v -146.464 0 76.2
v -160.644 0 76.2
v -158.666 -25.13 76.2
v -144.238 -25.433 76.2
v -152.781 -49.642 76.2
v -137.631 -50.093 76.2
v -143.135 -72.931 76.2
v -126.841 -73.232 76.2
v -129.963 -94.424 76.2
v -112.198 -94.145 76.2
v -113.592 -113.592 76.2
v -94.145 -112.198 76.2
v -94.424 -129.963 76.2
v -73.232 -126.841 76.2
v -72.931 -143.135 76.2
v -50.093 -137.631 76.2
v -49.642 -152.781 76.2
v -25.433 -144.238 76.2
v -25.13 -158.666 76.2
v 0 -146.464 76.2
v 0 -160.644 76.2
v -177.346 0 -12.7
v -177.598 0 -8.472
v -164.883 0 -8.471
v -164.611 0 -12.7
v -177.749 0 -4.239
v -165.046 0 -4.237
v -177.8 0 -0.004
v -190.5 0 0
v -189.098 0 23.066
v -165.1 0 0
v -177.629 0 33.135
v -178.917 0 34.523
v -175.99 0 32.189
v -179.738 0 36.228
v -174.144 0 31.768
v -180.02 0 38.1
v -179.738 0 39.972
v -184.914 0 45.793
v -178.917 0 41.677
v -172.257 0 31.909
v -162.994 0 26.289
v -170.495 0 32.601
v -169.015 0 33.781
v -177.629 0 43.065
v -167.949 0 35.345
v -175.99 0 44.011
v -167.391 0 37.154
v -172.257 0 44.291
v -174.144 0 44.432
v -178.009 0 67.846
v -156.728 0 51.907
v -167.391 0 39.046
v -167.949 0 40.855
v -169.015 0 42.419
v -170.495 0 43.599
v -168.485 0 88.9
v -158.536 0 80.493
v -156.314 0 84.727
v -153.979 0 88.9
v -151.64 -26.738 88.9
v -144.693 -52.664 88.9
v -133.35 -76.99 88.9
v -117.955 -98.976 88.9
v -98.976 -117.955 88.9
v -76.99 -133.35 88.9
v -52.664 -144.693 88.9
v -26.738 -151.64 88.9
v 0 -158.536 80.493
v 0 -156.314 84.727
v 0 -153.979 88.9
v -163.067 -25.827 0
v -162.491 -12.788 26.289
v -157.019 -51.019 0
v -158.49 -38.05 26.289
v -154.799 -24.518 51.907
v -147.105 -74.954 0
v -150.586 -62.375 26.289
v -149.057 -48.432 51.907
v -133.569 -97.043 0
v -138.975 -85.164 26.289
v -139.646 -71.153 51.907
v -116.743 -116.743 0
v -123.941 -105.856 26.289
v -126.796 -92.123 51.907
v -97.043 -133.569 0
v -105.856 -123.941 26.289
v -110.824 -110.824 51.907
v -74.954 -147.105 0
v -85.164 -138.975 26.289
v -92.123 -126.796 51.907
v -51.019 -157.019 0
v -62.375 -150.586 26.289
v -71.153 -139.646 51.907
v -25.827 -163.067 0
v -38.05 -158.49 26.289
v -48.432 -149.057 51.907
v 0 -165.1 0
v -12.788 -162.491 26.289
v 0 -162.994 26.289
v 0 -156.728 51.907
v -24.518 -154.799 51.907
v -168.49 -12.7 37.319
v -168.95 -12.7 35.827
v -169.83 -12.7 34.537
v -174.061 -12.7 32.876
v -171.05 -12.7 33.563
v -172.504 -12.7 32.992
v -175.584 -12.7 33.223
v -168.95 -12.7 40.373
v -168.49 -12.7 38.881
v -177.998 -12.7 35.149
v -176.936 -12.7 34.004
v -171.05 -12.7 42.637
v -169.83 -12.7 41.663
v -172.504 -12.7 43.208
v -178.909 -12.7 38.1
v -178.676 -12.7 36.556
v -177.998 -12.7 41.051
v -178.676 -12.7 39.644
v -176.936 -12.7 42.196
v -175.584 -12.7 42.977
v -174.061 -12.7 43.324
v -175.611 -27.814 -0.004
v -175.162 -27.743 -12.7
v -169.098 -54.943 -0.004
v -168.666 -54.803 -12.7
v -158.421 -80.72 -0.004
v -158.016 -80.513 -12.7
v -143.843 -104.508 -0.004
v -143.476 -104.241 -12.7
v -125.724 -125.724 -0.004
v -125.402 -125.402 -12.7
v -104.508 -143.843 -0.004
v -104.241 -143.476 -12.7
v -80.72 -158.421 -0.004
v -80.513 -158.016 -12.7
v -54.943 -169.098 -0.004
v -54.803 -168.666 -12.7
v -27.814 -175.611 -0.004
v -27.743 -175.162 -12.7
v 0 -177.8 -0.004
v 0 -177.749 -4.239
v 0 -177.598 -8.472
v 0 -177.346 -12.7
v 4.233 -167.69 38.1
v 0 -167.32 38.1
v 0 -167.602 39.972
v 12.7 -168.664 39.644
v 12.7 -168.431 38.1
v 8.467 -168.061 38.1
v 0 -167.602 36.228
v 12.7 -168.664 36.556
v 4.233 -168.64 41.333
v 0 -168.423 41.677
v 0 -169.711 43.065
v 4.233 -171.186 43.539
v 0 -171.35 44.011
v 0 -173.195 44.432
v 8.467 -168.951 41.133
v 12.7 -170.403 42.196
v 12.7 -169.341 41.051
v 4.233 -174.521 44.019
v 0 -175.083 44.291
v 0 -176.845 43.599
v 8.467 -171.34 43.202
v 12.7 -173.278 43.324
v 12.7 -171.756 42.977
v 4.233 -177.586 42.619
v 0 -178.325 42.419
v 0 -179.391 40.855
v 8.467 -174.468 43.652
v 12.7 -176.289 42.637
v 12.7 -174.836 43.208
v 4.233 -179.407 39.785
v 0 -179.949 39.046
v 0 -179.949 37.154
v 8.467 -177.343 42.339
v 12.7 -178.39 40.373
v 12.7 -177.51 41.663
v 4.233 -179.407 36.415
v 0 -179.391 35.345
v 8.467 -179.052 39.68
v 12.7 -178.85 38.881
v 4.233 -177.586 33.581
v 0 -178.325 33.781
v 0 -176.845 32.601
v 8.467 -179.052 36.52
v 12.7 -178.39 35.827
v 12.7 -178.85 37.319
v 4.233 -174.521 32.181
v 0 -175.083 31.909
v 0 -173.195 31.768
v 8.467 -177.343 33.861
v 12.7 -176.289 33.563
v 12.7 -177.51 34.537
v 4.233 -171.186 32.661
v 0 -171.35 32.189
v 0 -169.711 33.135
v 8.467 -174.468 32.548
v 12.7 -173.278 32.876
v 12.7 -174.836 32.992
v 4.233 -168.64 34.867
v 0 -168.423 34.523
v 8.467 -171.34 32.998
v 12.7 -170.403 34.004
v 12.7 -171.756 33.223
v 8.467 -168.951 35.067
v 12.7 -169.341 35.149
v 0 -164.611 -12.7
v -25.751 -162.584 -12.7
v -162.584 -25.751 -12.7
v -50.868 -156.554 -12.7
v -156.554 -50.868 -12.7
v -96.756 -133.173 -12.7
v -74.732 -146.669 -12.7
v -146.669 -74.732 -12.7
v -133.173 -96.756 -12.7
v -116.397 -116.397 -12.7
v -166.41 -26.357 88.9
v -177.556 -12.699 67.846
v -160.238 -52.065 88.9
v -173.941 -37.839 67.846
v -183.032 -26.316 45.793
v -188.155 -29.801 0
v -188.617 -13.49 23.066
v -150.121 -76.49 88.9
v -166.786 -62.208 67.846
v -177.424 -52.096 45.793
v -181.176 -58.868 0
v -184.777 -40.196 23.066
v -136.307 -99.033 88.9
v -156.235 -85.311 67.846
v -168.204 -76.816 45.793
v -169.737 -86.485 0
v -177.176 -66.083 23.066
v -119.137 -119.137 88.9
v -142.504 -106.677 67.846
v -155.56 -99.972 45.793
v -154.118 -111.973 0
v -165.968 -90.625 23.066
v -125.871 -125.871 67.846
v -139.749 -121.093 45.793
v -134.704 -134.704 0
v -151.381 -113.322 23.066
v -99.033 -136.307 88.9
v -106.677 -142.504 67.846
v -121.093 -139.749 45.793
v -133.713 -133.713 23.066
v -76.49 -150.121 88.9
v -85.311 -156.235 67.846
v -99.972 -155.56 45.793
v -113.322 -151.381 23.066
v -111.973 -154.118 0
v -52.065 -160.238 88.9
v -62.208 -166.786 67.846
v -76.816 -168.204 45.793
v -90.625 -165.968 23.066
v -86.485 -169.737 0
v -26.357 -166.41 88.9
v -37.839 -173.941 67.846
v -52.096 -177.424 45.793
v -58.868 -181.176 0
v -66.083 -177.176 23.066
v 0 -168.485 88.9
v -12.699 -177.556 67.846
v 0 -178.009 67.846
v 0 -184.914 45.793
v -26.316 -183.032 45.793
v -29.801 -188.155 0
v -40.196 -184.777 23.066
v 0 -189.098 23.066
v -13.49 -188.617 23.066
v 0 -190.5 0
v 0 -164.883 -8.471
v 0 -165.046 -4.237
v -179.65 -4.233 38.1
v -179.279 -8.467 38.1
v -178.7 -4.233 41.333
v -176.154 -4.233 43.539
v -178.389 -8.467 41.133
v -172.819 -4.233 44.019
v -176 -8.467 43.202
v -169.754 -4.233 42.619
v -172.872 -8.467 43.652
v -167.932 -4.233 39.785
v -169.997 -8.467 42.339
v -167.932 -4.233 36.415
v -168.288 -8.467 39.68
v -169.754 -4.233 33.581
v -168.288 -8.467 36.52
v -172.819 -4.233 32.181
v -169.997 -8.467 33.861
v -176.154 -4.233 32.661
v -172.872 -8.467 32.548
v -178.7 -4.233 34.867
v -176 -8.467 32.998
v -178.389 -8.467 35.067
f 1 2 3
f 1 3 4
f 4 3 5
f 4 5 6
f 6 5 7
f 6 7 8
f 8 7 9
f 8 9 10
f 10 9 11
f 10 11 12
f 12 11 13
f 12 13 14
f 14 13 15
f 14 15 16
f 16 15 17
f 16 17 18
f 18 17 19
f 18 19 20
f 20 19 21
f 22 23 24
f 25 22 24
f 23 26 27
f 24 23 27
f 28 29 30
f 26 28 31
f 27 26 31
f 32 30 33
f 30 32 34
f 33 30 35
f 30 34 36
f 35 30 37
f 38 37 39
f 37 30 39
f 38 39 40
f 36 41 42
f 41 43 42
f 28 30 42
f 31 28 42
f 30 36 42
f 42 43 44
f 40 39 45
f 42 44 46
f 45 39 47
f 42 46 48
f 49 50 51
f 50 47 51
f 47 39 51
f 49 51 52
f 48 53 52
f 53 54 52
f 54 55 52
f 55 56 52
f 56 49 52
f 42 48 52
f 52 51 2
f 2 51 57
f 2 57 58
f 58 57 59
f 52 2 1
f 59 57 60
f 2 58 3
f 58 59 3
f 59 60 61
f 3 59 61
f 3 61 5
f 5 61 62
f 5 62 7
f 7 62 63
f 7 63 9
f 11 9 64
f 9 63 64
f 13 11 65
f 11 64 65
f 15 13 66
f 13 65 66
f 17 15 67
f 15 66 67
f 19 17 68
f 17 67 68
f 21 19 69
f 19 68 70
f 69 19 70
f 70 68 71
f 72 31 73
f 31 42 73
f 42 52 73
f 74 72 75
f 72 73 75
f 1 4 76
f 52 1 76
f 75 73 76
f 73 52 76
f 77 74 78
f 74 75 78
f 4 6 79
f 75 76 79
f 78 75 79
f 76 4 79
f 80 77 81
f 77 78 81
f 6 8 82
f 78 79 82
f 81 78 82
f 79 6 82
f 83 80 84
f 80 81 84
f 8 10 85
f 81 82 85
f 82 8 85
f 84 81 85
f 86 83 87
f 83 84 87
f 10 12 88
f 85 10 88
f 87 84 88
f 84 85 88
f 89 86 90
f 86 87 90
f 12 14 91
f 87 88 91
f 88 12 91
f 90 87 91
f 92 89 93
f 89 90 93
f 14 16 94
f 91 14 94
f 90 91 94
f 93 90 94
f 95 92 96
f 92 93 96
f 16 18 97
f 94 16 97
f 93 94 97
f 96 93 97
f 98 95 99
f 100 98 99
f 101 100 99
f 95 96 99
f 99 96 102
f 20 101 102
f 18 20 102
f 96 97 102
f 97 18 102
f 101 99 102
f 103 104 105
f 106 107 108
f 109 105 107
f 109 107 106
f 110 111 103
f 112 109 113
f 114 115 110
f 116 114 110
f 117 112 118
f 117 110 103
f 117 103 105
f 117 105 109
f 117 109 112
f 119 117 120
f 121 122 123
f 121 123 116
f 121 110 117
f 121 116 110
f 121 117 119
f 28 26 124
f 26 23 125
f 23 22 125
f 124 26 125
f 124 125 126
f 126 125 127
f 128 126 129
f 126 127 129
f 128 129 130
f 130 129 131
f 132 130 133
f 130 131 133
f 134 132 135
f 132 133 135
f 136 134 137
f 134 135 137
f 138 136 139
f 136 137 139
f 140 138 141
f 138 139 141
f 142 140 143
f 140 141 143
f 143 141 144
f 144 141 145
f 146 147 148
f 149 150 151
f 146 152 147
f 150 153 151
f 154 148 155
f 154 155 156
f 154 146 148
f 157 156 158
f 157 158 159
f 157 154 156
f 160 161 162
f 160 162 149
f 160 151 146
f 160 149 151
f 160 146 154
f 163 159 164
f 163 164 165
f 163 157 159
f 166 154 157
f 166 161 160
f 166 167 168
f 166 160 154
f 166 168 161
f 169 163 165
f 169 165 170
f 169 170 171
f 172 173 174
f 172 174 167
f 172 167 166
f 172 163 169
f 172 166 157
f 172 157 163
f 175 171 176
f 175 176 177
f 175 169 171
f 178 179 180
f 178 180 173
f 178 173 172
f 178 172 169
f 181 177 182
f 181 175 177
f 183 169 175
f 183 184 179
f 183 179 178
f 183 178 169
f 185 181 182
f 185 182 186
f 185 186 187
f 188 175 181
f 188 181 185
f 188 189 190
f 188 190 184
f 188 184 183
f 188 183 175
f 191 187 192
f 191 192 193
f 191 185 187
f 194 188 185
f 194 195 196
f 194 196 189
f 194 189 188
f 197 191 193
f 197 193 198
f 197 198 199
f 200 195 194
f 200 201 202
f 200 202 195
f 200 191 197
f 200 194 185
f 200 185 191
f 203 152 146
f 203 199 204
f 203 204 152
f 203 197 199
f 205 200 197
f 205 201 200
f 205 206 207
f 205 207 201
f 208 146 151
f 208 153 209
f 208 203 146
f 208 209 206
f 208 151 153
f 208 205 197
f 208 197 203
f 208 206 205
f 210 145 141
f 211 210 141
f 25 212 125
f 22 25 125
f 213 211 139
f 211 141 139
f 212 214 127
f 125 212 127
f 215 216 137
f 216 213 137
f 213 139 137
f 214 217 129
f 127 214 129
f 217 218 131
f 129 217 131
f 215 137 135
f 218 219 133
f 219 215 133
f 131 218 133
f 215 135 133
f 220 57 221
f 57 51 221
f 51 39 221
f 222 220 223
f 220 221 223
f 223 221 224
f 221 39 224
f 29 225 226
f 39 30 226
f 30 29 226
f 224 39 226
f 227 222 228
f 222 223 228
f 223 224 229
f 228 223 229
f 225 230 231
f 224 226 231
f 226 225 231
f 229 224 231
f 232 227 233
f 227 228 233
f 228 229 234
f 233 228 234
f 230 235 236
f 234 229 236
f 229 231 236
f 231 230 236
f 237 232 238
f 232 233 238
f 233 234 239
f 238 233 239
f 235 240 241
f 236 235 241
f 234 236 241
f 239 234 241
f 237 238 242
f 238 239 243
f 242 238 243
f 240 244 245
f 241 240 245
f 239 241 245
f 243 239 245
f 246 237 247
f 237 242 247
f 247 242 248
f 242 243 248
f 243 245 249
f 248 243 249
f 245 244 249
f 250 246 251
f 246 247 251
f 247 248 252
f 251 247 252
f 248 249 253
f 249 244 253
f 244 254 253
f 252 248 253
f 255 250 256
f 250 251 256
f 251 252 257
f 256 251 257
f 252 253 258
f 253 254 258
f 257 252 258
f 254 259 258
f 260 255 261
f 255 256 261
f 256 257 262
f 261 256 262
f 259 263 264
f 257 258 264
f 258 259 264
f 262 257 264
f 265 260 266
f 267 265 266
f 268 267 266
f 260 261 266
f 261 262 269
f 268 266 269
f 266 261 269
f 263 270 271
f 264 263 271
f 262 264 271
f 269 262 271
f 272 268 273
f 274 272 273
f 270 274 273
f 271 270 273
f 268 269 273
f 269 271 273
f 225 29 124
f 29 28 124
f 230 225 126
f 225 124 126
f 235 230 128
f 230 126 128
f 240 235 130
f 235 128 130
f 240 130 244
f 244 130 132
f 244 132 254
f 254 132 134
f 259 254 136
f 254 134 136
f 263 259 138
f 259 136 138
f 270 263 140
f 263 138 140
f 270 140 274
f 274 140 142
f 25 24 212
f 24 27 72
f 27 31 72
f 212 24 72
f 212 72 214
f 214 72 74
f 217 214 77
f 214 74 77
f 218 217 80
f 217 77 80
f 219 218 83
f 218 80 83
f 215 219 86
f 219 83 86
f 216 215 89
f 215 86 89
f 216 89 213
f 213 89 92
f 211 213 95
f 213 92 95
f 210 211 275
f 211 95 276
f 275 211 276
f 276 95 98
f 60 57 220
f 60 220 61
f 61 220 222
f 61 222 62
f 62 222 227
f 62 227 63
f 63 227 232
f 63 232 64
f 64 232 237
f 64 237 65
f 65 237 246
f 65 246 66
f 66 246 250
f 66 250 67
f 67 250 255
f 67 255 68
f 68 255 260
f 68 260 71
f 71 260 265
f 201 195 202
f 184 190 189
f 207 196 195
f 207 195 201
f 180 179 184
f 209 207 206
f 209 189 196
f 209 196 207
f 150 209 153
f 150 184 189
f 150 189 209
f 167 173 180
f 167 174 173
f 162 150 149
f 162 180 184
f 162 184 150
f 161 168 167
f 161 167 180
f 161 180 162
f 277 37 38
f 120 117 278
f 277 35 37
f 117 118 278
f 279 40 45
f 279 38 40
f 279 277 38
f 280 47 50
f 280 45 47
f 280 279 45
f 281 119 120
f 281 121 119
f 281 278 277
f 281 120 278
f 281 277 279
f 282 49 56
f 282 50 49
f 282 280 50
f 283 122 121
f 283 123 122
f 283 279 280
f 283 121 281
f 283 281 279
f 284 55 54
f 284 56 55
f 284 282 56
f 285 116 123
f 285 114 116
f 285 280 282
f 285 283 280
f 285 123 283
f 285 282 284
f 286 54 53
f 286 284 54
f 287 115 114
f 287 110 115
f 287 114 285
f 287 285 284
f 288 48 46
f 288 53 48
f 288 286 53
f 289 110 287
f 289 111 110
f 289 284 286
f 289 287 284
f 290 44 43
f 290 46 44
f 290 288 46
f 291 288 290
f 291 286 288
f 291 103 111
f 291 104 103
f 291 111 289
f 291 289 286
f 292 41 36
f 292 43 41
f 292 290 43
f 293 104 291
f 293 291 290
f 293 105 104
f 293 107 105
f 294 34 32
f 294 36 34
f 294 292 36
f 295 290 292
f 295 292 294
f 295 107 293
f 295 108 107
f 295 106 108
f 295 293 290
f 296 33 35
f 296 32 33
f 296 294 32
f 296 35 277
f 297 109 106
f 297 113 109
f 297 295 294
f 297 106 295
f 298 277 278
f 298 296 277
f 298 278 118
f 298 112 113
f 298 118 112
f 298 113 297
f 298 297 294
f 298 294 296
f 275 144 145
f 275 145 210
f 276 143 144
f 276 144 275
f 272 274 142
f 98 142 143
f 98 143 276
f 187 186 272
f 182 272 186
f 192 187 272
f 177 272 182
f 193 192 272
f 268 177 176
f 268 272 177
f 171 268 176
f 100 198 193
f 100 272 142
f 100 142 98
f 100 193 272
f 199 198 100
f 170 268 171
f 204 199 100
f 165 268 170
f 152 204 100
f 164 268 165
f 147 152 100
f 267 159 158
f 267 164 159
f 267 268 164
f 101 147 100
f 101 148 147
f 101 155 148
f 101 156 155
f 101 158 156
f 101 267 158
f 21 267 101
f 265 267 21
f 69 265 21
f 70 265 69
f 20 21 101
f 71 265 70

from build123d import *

# Parameters (mm, degrees)
F1_ANGLE = 90
F2_R     = 6.35
F3_DEPTH = 12.7
F3_TAPER = 5
F4_R     = 6.35
F5_DEPTH = 12.7
F5_TAPER = 5


# Not quite as in the source:
# - a feature names something its author has since deleted; it is built from what else it names


with BuildPart() as f1:
    # F0 (on Front) → F1 (revolve)
    with BuildSketch(Plane.XZ):
        with BuildLine():
            Line((-190.5, 0), (-177.7999999529, -0.0040913673))
            ThreePointArc((-177.7999999529, -0.0040913673), (-177.6863527462, -6.3561031883), (-177.3458485559, -12.7))
            Line((-177.3458485559, -12.7), (-164.6108137396, -12.7))
            ThreePointArc((-164.6108137396, -12.7), (-164.9776583118, -6.354703608), (-165.1, 1.06856e-05))
            ThreePointArc((-165.1, 1.06856e-05), (-160.3732216696, 39.2229495488), (-146.4635449523, 76.2))
            Line((-146.4635449523, 76.2), (-160.6437051366, 76.2))
            ThreePointArc((-160.6437051366, 76.2), (-157.4396201151, 82.6172259157), (-153.9793167929, 88.9))
            Line((-153.9793167929, 88.9), (-168.4845393501, 88.9))
            ThreePointArc((-168.4845393501, 88.9), (-184.9142432943, 45.792713688), (-190.5, 0))
        make_face()
    revolve(axis=Axis((0, 0, 38.1), (0, 0, 1)), revolution_arc=F1_ANGLE)

    # F2 (on face) → F3 (join)
    with BuildSketch(Plane.YZ):
        with Locations((-173.669888006, 38.1)):
            Circle(F2_R)
    extrude(amount=F3_DEPTH, taper=F3_TAPER)

    # F4 (on face) → F5 (cut)
    with BuildSketch(Plane(origin=(0, 0, 0), x_dir=(-1, 0, 0), z_dir=(0, 1, 0))):
        with Locations((173.669888006, 38.1)):
            Circle(F4_R)
    extrude(amount=-F5_DEPTH, taper=F5_TAPER, mode=Mode.SUBTRACT)


solid = f1.part
